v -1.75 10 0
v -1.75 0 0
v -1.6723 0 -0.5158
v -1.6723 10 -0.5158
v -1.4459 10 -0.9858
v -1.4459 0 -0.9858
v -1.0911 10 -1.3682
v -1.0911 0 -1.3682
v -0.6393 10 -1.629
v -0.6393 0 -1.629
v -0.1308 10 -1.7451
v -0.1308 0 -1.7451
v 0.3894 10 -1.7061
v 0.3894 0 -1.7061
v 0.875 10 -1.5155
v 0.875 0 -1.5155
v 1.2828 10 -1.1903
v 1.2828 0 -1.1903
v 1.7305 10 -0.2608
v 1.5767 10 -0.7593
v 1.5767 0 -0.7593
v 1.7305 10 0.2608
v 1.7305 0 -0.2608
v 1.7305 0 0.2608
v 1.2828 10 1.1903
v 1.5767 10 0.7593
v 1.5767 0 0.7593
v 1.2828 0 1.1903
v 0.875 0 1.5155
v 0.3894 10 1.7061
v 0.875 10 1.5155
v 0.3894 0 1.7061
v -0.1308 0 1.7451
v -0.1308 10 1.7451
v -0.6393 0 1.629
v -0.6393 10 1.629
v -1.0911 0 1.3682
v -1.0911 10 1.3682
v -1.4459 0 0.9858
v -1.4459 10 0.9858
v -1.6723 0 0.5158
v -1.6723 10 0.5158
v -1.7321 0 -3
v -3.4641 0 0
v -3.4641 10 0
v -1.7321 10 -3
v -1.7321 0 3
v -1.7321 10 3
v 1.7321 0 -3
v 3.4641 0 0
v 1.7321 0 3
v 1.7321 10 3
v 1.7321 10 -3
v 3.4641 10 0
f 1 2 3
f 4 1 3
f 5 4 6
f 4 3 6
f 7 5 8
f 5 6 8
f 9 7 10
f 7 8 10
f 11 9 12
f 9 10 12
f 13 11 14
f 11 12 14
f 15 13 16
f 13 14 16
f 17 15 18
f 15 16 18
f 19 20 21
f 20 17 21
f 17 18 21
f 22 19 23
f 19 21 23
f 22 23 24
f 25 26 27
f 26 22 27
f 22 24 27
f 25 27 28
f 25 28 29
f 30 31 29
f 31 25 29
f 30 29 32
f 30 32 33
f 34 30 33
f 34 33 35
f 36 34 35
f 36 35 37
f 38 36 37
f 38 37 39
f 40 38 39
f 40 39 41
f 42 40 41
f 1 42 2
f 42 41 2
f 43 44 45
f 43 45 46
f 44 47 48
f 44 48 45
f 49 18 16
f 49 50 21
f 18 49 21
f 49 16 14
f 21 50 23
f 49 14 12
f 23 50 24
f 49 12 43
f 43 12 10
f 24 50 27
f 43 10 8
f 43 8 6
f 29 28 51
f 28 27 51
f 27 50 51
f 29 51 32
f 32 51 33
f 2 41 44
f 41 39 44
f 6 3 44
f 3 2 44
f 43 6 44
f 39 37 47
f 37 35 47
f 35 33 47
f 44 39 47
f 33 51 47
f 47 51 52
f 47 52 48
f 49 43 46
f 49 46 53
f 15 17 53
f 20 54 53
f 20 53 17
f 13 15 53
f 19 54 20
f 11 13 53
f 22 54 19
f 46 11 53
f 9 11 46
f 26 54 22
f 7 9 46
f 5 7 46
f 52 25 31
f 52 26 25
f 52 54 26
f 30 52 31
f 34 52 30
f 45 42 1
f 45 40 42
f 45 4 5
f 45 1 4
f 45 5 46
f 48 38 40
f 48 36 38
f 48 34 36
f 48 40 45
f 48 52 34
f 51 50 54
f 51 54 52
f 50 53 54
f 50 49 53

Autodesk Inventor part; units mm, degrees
ref_plane "YZ Plane" through (0, 0, 0) normal (1, 0, 0) x (0, 1, 0)
ref_plane "XZ Plane" through (0, 0, 0) normal (0, 1, 0) x (-1, 0, 0)
ref_plane "XY Plane" through (0, 0, 0) normal (0, 0, 1) x (1, 0, 0)
sketch "Sketch1" plane through (0, 0, 0) normal (0, 1, 0) x (-1, 0, 0)
  circle A0 centre (0, 0) radius 1.75
  line L0 (3.4641, 0) -> (1.7321, -3)
  line L1 (1.7321, -3) -> (-1.7321, -3)
  line L2 (-1.7321, -3) -> (-3.4641, 0)
  line L3 (-3.4641, 0) -> (-1.7321, 3)
  line L4 (-1.7321, 3) -> (1.7321, 3)
  line L5 (1.7321, 3) -> (3.4641, 0)
  point P0 (0, -3)
  point P1 (0, 3)
  dimension "d0" = 3.5
  dimension "d1" = 6
extrude "Extrusion1" add sketch "Sketch1" along normal blind 10
properties part number "Heated Bed Spacer" material "ABS Plastic"
